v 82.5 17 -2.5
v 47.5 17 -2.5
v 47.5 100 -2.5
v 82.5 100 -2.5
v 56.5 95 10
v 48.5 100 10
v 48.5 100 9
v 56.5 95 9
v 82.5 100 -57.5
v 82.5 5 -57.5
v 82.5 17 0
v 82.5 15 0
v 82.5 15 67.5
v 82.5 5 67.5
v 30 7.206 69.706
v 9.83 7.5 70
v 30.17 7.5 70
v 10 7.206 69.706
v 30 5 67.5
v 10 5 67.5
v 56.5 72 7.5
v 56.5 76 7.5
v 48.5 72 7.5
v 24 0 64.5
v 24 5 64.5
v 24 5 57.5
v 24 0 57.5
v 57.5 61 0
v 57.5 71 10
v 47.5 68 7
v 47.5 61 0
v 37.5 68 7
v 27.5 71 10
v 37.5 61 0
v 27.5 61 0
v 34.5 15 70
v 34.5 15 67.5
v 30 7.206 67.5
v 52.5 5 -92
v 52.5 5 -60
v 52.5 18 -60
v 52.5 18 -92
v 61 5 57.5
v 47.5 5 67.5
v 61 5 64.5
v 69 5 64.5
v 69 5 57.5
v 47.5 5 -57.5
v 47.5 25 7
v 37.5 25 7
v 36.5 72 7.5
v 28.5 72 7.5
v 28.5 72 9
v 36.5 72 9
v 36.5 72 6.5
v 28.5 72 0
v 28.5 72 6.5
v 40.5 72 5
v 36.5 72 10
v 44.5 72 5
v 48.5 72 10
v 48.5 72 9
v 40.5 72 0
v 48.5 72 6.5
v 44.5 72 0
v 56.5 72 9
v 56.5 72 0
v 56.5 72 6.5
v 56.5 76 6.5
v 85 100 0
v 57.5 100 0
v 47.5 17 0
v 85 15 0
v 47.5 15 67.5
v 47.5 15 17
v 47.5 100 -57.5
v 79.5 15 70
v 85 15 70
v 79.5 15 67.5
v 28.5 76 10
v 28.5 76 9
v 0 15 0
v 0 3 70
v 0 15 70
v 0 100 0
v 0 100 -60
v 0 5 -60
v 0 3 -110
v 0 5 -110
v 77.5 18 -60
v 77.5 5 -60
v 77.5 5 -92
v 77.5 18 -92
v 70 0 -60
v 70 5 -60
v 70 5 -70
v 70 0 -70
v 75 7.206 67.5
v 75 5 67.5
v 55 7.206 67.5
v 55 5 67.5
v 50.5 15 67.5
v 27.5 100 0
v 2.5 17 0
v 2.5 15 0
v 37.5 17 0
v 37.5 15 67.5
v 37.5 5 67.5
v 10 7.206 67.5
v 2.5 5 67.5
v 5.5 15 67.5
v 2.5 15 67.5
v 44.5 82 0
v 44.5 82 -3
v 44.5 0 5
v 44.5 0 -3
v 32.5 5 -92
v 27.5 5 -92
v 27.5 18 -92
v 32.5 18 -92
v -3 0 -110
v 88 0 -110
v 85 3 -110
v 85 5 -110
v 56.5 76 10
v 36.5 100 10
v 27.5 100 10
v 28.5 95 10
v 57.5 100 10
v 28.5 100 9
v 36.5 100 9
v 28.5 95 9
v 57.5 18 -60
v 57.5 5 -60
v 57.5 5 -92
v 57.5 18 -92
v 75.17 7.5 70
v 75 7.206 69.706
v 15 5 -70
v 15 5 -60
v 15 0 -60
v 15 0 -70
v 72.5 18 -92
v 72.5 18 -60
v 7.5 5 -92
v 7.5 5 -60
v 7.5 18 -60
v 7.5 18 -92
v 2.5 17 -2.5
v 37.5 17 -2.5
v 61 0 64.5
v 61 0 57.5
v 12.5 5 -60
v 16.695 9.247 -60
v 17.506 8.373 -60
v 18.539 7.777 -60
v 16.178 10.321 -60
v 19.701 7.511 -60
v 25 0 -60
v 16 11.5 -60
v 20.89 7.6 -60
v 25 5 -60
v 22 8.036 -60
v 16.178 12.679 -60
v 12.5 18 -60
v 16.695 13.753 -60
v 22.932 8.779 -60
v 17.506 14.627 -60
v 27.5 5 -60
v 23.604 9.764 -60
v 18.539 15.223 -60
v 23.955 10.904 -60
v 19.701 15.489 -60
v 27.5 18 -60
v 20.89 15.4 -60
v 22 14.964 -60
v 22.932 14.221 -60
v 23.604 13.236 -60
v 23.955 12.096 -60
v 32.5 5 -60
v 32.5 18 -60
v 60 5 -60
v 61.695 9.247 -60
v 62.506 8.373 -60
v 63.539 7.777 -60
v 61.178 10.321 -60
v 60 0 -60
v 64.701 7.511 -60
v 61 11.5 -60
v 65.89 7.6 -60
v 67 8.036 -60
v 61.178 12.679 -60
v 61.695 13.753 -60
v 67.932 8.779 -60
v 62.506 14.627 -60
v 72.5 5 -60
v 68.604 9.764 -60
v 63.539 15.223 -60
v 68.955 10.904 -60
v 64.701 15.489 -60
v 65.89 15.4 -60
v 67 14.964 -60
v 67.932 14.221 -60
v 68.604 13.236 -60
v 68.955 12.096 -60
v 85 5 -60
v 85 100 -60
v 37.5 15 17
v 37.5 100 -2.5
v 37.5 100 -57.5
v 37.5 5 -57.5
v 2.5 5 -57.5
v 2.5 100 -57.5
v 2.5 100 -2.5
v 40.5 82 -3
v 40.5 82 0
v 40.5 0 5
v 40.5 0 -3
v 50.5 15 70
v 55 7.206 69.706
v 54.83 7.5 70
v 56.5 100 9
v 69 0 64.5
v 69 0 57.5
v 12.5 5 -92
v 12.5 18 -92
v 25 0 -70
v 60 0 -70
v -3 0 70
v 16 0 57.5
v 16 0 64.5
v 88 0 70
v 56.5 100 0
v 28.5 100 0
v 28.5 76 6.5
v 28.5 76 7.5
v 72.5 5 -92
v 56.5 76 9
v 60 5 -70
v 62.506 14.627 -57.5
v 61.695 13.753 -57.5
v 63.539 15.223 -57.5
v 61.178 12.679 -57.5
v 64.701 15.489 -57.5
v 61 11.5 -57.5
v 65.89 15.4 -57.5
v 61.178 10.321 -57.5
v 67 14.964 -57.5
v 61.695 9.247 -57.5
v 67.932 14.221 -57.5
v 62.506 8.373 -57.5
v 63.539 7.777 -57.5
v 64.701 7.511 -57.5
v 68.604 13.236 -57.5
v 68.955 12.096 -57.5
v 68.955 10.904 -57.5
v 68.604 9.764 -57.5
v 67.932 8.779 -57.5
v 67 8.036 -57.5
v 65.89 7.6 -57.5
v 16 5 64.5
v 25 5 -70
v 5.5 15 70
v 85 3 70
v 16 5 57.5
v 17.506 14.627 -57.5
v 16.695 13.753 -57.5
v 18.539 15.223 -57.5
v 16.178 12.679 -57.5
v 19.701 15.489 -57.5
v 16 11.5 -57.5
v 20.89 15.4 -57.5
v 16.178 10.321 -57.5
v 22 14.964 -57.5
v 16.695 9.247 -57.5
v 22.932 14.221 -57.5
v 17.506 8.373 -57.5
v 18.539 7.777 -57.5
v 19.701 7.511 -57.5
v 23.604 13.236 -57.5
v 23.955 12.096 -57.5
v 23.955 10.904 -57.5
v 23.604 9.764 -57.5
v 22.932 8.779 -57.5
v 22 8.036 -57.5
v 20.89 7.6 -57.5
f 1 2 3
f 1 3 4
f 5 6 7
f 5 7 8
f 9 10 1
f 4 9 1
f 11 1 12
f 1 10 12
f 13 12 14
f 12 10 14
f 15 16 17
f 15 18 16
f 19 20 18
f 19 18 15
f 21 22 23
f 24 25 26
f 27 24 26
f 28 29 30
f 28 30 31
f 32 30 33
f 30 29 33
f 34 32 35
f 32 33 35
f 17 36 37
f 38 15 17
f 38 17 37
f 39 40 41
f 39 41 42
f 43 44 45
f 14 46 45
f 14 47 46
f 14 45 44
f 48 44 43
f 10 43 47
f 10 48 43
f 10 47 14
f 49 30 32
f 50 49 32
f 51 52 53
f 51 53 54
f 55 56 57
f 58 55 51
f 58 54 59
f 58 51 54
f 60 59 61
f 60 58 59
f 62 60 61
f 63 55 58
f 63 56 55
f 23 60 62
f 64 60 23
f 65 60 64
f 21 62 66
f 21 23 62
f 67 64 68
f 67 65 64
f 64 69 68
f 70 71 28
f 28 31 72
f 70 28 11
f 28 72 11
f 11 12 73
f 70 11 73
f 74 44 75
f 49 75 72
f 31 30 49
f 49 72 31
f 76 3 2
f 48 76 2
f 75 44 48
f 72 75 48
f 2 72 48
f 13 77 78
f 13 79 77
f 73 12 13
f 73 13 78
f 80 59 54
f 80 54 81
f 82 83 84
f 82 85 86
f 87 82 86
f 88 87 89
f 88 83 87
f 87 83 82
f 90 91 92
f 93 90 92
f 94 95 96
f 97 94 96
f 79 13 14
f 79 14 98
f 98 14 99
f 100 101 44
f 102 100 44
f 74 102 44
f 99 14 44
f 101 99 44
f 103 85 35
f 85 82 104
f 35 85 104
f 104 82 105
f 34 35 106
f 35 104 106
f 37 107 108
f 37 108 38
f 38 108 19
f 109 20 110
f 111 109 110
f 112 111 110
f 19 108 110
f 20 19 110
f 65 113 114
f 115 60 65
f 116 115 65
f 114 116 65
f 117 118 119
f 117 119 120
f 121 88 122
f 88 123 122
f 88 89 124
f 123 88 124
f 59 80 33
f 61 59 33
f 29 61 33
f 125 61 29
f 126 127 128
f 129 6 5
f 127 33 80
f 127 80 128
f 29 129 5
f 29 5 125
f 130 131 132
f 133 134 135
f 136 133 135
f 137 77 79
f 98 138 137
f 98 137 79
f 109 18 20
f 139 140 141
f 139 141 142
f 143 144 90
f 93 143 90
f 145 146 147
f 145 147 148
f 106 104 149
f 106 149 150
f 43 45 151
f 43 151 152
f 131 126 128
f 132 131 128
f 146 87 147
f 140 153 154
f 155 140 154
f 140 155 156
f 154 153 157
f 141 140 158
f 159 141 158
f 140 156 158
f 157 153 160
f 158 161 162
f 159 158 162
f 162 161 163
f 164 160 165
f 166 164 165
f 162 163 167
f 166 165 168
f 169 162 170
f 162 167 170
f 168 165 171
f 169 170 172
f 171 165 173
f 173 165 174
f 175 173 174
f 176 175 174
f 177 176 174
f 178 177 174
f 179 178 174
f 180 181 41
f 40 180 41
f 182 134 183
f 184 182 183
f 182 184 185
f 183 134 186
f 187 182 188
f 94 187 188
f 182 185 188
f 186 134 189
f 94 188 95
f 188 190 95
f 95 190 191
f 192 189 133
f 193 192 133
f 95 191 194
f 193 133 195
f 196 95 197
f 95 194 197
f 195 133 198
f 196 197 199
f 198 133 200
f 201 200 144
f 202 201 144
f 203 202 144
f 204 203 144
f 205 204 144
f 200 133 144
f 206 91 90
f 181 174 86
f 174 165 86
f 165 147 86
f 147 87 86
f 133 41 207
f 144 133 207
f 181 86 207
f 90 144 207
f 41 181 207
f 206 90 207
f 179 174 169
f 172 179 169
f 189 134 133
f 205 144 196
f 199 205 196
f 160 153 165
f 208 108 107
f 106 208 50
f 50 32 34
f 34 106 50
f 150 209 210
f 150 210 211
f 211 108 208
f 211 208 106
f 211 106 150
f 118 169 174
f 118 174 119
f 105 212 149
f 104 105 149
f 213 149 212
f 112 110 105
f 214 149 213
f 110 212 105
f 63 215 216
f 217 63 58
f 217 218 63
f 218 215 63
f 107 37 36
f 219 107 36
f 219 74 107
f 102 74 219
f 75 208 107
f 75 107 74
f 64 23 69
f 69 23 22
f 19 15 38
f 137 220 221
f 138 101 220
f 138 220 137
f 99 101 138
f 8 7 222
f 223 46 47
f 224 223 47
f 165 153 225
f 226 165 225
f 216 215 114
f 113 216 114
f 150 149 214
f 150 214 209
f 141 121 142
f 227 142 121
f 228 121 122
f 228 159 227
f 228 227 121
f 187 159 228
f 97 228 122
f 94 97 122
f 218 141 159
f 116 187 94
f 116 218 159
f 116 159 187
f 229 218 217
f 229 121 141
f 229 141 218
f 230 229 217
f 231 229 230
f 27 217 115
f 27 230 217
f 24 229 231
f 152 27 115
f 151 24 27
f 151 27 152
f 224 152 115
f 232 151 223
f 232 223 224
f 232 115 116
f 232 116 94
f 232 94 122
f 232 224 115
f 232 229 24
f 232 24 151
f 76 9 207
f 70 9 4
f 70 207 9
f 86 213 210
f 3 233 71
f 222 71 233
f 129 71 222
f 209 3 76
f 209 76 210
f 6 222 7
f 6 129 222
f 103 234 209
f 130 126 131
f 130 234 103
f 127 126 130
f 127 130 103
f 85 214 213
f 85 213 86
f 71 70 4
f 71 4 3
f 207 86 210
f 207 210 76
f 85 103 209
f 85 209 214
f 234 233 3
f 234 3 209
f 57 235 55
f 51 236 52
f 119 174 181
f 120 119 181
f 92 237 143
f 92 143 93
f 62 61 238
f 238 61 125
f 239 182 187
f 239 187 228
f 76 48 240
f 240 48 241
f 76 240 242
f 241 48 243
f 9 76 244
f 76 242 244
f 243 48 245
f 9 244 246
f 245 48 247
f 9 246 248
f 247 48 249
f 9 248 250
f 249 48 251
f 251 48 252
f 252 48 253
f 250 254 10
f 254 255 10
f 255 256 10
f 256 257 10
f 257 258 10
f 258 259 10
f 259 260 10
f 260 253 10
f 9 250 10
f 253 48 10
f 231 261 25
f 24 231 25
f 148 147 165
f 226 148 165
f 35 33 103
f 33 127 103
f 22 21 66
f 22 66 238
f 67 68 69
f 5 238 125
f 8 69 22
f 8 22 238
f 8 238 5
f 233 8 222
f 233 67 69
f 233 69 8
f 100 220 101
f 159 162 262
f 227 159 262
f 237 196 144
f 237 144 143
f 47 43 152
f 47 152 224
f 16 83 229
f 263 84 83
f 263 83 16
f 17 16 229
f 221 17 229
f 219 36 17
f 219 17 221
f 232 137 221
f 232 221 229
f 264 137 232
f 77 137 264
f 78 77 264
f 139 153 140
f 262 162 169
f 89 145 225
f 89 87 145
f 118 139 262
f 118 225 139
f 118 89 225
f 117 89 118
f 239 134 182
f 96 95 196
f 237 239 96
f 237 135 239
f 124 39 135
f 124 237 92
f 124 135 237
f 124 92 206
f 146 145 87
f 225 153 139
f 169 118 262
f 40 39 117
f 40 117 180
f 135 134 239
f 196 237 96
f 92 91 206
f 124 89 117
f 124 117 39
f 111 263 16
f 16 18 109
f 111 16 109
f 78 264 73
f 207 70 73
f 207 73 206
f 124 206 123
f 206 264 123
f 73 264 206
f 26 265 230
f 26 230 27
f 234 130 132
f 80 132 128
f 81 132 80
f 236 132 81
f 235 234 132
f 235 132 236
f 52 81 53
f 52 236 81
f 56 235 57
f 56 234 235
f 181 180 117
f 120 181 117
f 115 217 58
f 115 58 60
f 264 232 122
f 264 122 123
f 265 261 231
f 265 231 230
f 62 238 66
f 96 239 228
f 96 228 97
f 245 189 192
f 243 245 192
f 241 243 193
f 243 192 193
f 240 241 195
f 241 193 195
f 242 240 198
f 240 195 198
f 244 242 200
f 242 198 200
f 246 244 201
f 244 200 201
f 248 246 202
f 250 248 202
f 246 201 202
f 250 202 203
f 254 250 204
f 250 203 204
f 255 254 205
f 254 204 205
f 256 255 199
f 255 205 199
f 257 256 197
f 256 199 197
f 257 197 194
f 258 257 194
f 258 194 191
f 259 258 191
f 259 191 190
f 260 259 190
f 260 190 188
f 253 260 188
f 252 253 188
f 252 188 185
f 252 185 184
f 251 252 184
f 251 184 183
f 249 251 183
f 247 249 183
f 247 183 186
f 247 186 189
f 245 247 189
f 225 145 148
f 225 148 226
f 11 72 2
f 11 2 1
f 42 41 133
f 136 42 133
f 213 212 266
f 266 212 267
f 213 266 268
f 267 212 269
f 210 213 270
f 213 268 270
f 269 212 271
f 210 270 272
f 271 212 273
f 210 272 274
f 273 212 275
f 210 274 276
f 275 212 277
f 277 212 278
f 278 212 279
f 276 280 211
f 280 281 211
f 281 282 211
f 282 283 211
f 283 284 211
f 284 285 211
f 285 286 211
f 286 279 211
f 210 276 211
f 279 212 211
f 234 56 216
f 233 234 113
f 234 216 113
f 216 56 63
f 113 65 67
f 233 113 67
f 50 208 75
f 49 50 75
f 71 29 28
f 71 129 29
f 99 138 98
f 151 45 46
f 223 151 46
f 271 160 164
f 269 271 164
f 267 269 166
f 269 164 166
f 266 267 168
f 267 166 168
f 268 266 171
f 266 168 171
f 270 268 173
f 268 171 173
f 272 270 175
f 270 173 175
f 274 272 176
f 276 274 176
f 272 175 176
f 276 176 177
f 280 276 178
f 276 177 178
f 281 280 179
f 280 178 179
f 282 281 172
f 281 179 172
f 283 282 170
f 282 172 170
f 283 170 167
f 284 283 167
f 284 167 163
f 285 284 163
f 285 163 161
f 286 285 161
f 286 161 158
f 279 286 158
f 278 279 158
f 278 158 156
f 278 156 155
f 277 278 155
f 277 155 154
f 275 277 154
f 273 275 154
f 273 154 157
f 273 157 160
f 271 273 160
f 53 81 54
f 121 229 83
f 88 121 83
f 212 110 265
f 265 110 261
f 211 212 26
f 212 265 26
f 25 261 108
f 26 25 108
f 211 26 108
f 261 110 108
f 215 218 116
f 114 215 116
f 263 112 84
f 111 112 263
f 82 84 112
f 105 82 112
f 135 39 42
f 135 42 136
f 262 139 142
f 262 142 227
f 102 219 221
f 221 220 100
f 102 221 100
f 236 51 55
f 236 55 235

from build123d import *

# Parameters (mm, degrees)
SKETCH1_W                                 = 85
SKETCH1_H                                 = 60
BOSS_EXTRUDE1_DEPTH                       = 100
CUT_EXTRUDE1_START                        = 5
SKETCH2_W                                 = 35
SKETCH2_H                                 = 55
CUT_EXTRUDE1_DEPTH                        = 95
SKETCH3_W                                 = 85
SKETCH3_H                                 = 5
BOSS_EXTRUDE2_DEPTH                       = 70
BOSS_EXTRUDE3_DEPTH                       = 10
SKETCH5_W                                 = 20
SKETCH5_H                                 = 2.5
CUT_EXTRUDE2_DEPTH                        = 7.5
SKETCH6_W                                 = 35
SKETCH6_H                                 = 12
CUT_EXTRUDE4_DEPTH                        = 57.5
CUT_EXTRUDE6_REACH                        = 186.73
SKETCH7_R                                 = 4
SKETCH9_W                                 = 85
SKETCH9_H                                 = 50
BOSS_EXTRUDE4_DEPTH                       = 5
SKETCH13_W                                = 8
SKETCH13_H                                = 7
CUT_EXTRUDE8_BUTTON_HOLES_DEPTH           = 169.374582405
BOSS_EXTRUDE5_OLED_MOUNT_DEPTH            = 10
BOSS_EXTRUDE6_OLED_MOUNT_DEPTH            = 1
BOSS_EXTRUDE7_START                       = -2.5
BOSS_EXTRUDE7_OLED_MOUNT_DEPTH            = 1
BOSS_EXTRUDE8_OLED_MOUNT_DEPTH            = 1
BOSS_EXTRUDE13_OLED_MOUNT_SUPPORT_DEPTH   = 30
CUT_EXTRUDE9_OLED_CABLE_DEPTH             = 10
CUT_EXTRUDE9_OLED_CABLE_DEPTH_BACK        = 157.553505231
SKETCH18_W                                = 4
SKETCH18_H                                = 8
BOSS_EXTRUDE12_OLED_CABLE_GUIDE_REACH     = 164.942
SKETCH20_W                                = 10
SKETCH20_H                                = 10
CUT_EXTRUDE10_SOLENOID_WIRE_HOLE_DEPTH    = 169.374582405
SKETCH21_W                                = 5
SKETCH21_H                                = 32
BOSS_EXTRUDE9_SOLENOID_SIDE_SUPPORT_DEPTH = 13
CHAMFER3_THUMB_SIZE                       = 2.5
CHAMFER5_THUMB_SIZE                       = 4.5
CHAMFER5_THUMB_SIZE2                      = 7.794228634
CHAMFER5_THUMB_PART_2_SIZE                = 4.5
CHAMFER5_THUMB_PART_2_SIZE2               = 7.794228634
CHAMFER5_THUMB_PART_3_SIZE                = 4.5
CHAMFER5_THUMB_PART_3_SIZE2               = 7.794228634
BOSS_EXTRUDE5_GUIDE_DEPTH                 = 180
SKETCH49_W                                = 10
SKETCH49_H                                = 10
BOSS_EXTRUDE14_DEPTH                      = 10
CHAMFER8_SIZE                             = 10


with BuildPart() as part:
    # Sketch1 → Boss-Extrude1 (new body)
    with BuildSketch(Plane(origin=(0, 0, 0), x_dir=(1, 0, 0), z_dir=(0, 1, 0))):
        with Locations((42.5, 30)):
            Rectangle(SKETCH1_W, SKETCH1_H)
    extrude(amount=BOSS_EXTRUDE1_DEPTH)

    # Sketch2 → Cut-Extrude1 (cut)
    with BuildSketch(Plane(origin=(0, 0, 0), x_dir=(1, 0, 0), z_dir=(0, 1, 0)).offset(CUT_EXTRUDE1_START)):
        with Locations((20, 30)):
            Rectangle(SKETCH2_W, SKETCH2_H)
        with Locations((65, 30)):
            Rectangle(SKETCH2_W, SKETCH2_H)
    extrude(amount=CUT_EXTRUDE1_DEPTH, mode=Mode.SUBTRACT)

    # Sketch3 → Boss-Extrude2 (add)
    with BuildSketch(Plane.XY):
        with Locations((42.5, 2.5)):
            Rectangle(SKETCH3_W, SKETCH3_H)
    extrude(amount=BOSS_EXTRUDE2_DEPTH)

    # Sketch4 → Boss-Extrude3 (add)
    with BuildSketch(Plane(origin=(0, 5, 0), x_dir=(1, 0, 0), z_dir=(0, 1, 0))):
        Polygon((85, 0), (82.5, 0), (82.5, -67.5), (47.5, -67.5), (47.5, 0), (37.5, 0), (37.5, -67.5), (2.5, -67.5), (2.5, 0), (0, 0), (0, -70), (85, -70), align=None)
    extrude(amount=BOSS_EXTRUDE3_DEPTH)

    # Sketch5 → Cut-Extrude2 (cut)
    with BuildSketch(Plane(origin=(0, 15, 0), x_dir=(1, 0, 0), z_dir=(0, 1, 0))):
        with Locations((20, -68.75)):
            Rectangle(SKETCH5_W, SKETCH5_H)
        with Locations((65, -68.75)):
            Rectangle(SKETCH5_W, SKETCH5_H)
    extrude(amount=-CUT_EXTRUDE2_DEPTH, mode=Mode.SUBTRACT)

    # Sketch6 → Cut-Extrude4 (cut)
    with BuildSketch(Plane.XY):
        with Locations((20, 11)):
            Rectangle(SKETCH6_W, SKETCH6_H)
        with Locations((65, 11)):
            Rectangle(SKETCH6_W, SKETCH6_H)
    extrude(amount=-CUT_EXTRUDE4_DEPTH, mode=Mode.SUBTRACT)

    # Sketch7 → Cut-Extrude6 (cut, up to next)
    with BuildSketch(Plane(origin=(0, 0, -60), x_dir=(-1, 0, 0), z_dir=(0, 0, -1)), mode=Mode.PRIVATE) as cut_extrude6_sk1:
        with Locations((-20, 11.5)):
            Circle(SKETCH7_R)
    cut_extrude6_tool1 = extrude(cut_extrude6_sk1.sketch, amount=-CUT_EXTRUDE6_REACH, mode=Mode.PRIVATE) & part.part
    # Sketch7 → Cut-Extrude6 (cut, up to next)
    with BuildSketch(Plane(origin=(0, 0, -60), x_dir=(-1, 0, 0), z_dir=(0, 0, -1)), mode=Mode.PRIVATE) as cut_extrude6_sk2:
        with Locations((-65, 11.5)):
            Circle(SKETCH7_R)
    cut_extrude6_tool2 = extrude(cut_extrude6_sk2.sketch, amount=-CUT_EXTRUDE6_REACH, mode=Mode.PRIVATE) & part.part
    add(cut_extrude6_tool1.solids().sort_by_distance((20, 11.5, -60))[0], mode=Mode.SUBTRACT)
    add(cut_extrude6_tool2.solids().sort_by_distance((65, 11.5, -60))[0], mode=Mode.SUBTRACT)

    # Sketch9 → Boss-Extrude4 (add)
    with BuildSketch(Plane(origin=(0, 0, 0), x_dir=(1, 0, 0), z_dir=(0, 1, 0))):
        with Locations((42.5, 85)):
            Rectangle(SKETCH9_W, SKETCH9_H)
    extrude(amount=BOSS_EXTRUDE4_DEPTH)

    # Sketch13 → Cut-Extrude8 (Button Holes) (cut, through all)
    with BuildSketch(Plane(origin=(0, 5, 0), x_dir=(1, 0, 0), z_dir=(0, 1, 0))):
        with Locations((20, -61)):
            Rectangle(SKETCH13_W, SKETCH13_H)
        with Locations((65, -61)):
            Rectangle(SKETCH13_W, SKETCH13_H)
    extrude(amount=-CUT_EXTRUDE8_BUTTON_HOLES_DEPTH, mode=Mode.SUBTRACT)

    # Sketch14 → Boss-Extrude5 (OLED Mount) (add)
    with BuildSketch(Plane.XY):
        Polygon((27.5, 100), (28.5, 100), (28.5, 72), (56.5, 72), (56.5, 100), (57.5, 100), (57.5, 71), (52.172712592, 71), (32.827287408, 71), (27.5, 71), align=None)
    extrude(amount=BOSS_EXTRUDE5_OLED_MOUNT_DEPTH)

    # Sketch15 → Boss-Extrude6 (OLED Mount) (add)
    with BuildSketch(Plane.XY.offset(10)):
        Polygon((28.5, 72), (36.5, 72), (28.5, 76), align=None)
        Polygon((56.5, 76), (56.5, 72), (48.5, 72), align=None)
    extrude(amount=-BOSS_EXTRUDE6_OLED_MOUNT_DEPTH)

    # Sketch15<2> → Boss-Extrude7 (OLED Mount) (add)
    with BuildSketch(Plane.XY.offset(10).offset(BOSS_EXTRUDE7_START)):
        Polygon((28.5, 72), (36.5, 72), (28.5, 76), align=None)
        Polygon((56.5, 76), (56.5, 72), (48.5, 72), align=None)
    extrude(amount=-BOSS_EXTRUDE7_OLED_MOUNT_DEPTH)

    # Sketch17 → Boss-Extrude8 (OLED Mount) (add)
    with BuildSketch(Plane.XY.offset(10)):
        Polygon((56.5, 95), (56.5, 100), (48.5, 100), align=None)
        Polygon((28.5, 100), (36.5, 100), (28.5, 95), align=None)
    extrude(amount=-BOSS_EXTRUDE8_OLED_MOUNT_DEPTH)

    # Sketch32 → Boss-Extrude13 OLED Mount Support) (add)
    with BuildSketch(Plane.ZY.offset(-27.5)):
        Polygon((0, 71), (10, 71), (0, 61), align=None)
    extrude(amount=-BOSS_EXTRUDE13_OLED_MOUNT_SUPPORT_DEPTH)

    # Sketch18 → Cut-Extrude9 (OLED Cable) (cut, two sides: drawn at the far end of the back side and taken through both)
    with BuildSketch(Plane(origin=(0, 72, 0), x_dir=(1, 0, 0), z_dir=(0, 1, 0)).offset(-CUT_EXTRUDE9_OLED_CABLE_DEPTH_BACK)):
        with Locations((42.5, -1)):
            Rectangle(SKETCH18_W, SKETCH18_H)
    extrude(amount=CUT_EXTRUDE9_OLED_CABLE_DEPTH + CUT_EXTRUDE9_OLED_CABLE_DEPTH_BACK, mode=Mode.SUBTRACT)

    # Boss-Extrude12 (OLED Cable Guide): up to this plane
    boss_extrude12_oled_cable_guide_end = Plane(origin=(57.5, 71, 10), z_dir=(0, -0.7071067811865475, 0.7071067811865476))
    # Sketch31 → Boss-Extrude12 (OLED Cable Guide) (add, up to the surface)
    with BuildSketch(Plane(origin=(0, 15, 0), x_dir=(1, 0, 0), z_dir=(0, 1, 0)), mode=Mode.PRIVATE) as boss_extrude12_oled_cable_guide_sk1:
        Polygon((37.5, 0), (40.5, 0), (40.5, -5), (44.5, -5), (44.5, 0), (47.5, 0), (47.5, -7), (37.5, -7), align=None)
    boss_extrude12_oled_cable_guide_tool1 = split(extrude(boss_extrude12_oled_cable_guide_sk1.sketch, amount=BOSS_EXTRUDE12_OLED_CABLE_GUIDE_REACH, mode=Mode.PRIVATE), bisect_by=boss_extrude12_oled_cable_guide_end, keep=Keep.BOTH, mode=Mode.PRIVATE)
    add(boss_extrude12_oled_cable_guide_tool1.solids().sort_by_distance((39, 15, 0.122066))[0])

    # Sketch20 → Cut-Extrude10 (Solenoid Wire Hole) (cut, through all)
    with BuildSketch(Plane(origin=(0, 5, 0), x_dir=(1, 0, 0), z_dir=(0, 1, 0))):
        with Locations((65, 65)):
            Rectangle(SKETCH20_W, SKETCH20_H)
        with Locations((20, 65)):
            Rectangle(SKETCH20_W, SKETCH20_H)
    extrude(amount=-CUT_EXTRUDE10_SOLENOID_WIRE_HOLE_DEPTH, mode=Mode.SUBTRACT)

    # Sketch21 → Boss-Extrude9 (Solenoid Side Support) (add)
    with BuildSketch(Plane(origin=(0, 5, 0), x_dir=(1, 0, 0), z_dir=(0, 1, 0))):
        with Locations((75, 76)):
            Rectangle(SKETCH21_W, SKETCH21_H)
        with Locations((55, 76)):
            Rectangle(SKETCH21_W, SKETCH21_H)
        with Locations((30, 76)):
            Rectangle(SKETCH21_W, SKETCH21_H)
        with Locations((10, 76)):
            Rectangle(SKETCH21_W, SKETCH21_H)
    extrude(amount=BOSS_EXTRUDE9_SOLENOID_SIDE_SUPPORT_DEPTH)

    # Chamfer3 (Thumb)
    chamfer3_thumb_edges = [part.edges().sort_by_distance(p)[0] for p in [
        (20, 7.5, 67.5),
        (65, 7.5, 67.5),
    ]]
    chamfer(chamfer3_thumb_edges, length=CHAMFER3_THUMB_SIZE - 0.0001)  # a hair under: the kernel refuses the full size

    # Chamfer5 (Thumb)
    chamfer5_thumb_edges = [part.edges().sort_by_distance(p)[0] for p in [
        (75, 15, 68.75),
    ]]
    chamfer5_thumb_side = [part.faces().sort_by_distance(p)[0] for p in [
        (83.266129032, 15, 38.266129032),
    ]]
    chamfer(chamfer5_thumb_edges, length=CHAMFER5_THUMB_SIZE, length2=CHAMFER5_THUMB_SIZE2, reference=chamfer5_thumb_side[0])

    # Chamfer5 (Thumb) part 2
    chamfer5_thumb_part_2_edges = [part.edges().sort_by_distance(p)[0] for p in [
        (55, 15, 68.75),
        (30, 15, 68.75),
    ]]
    chamfer5_thumb_part_2_side = [part.faces().sort_by_distance(p)[0] for p in [
        (42.5, 15, 40.199438202),
    ]]
    chamfer(chamfer5_thumb_part_2_edges, length=CHAMFER5_THUMB_PART_2_SIZE, length2=CHAMFER5_THUMB_PART_2_SIZE2, reference=chamfer5_thumb_part_2_side[0])

    # Chamfer5 (Thumb) part 3
    chamfer5_thumb_part_3_edges = [part.edges().sort_by_distance(p)[0] for p in [
        (10, 15, 68.75),
    ]]
    chamfer5_thumb_part_3_side = [part.faces().sort_by_distance(p)[0] for p in [
        (1.733870968, 15, 38.266129032),
    ]]
    chamfer(chamfer5_thumb_part_3_edges, length=CHAMFER5_THUMB_PART_3_SIZE, length2=CHAMFER5_THUMB_PART_3_SIZE2, reference=chamfer5_thumb_part_3_side[0])

    # Sketch37 → Boss-Extrude5 (Guide) (add, through all)
    with BuildSketch(Plane.XY.offset(70)):
        Polygon((85, 0), (88, 0), (85, 3), align=None)
        Polygon((0, 0), (-3, 0), (0, 3), align=None)
    extrude(amount=-BOSS_EXTRUDE5_GUIDE_DEPTH)

    # Sketch49 → Boss-Extrude14 (add)
    with BuildSketch(Plane(origin=(0, 15, 0), x_dir=(1, 0, 0), z_dir=(0, 1, 0))):
        with Locations((42.5, -12)):
            Rectangle(SKETCH49_W, SKETCH49_H)
    extrude(amount=BOSS_EXTRUDE14_DEPTH)

    # Chamfer8
    chamfer8_edges = [part.edges().sort_by_distance(p)[0] for p in [
        (42.5, 25, 17),
    ]]
    chamfer(chamfer8_edges, length=CHAMFER8_SIZE - 0.0001)  # a hair under: the kernel refuses the full size


solid = part.part
